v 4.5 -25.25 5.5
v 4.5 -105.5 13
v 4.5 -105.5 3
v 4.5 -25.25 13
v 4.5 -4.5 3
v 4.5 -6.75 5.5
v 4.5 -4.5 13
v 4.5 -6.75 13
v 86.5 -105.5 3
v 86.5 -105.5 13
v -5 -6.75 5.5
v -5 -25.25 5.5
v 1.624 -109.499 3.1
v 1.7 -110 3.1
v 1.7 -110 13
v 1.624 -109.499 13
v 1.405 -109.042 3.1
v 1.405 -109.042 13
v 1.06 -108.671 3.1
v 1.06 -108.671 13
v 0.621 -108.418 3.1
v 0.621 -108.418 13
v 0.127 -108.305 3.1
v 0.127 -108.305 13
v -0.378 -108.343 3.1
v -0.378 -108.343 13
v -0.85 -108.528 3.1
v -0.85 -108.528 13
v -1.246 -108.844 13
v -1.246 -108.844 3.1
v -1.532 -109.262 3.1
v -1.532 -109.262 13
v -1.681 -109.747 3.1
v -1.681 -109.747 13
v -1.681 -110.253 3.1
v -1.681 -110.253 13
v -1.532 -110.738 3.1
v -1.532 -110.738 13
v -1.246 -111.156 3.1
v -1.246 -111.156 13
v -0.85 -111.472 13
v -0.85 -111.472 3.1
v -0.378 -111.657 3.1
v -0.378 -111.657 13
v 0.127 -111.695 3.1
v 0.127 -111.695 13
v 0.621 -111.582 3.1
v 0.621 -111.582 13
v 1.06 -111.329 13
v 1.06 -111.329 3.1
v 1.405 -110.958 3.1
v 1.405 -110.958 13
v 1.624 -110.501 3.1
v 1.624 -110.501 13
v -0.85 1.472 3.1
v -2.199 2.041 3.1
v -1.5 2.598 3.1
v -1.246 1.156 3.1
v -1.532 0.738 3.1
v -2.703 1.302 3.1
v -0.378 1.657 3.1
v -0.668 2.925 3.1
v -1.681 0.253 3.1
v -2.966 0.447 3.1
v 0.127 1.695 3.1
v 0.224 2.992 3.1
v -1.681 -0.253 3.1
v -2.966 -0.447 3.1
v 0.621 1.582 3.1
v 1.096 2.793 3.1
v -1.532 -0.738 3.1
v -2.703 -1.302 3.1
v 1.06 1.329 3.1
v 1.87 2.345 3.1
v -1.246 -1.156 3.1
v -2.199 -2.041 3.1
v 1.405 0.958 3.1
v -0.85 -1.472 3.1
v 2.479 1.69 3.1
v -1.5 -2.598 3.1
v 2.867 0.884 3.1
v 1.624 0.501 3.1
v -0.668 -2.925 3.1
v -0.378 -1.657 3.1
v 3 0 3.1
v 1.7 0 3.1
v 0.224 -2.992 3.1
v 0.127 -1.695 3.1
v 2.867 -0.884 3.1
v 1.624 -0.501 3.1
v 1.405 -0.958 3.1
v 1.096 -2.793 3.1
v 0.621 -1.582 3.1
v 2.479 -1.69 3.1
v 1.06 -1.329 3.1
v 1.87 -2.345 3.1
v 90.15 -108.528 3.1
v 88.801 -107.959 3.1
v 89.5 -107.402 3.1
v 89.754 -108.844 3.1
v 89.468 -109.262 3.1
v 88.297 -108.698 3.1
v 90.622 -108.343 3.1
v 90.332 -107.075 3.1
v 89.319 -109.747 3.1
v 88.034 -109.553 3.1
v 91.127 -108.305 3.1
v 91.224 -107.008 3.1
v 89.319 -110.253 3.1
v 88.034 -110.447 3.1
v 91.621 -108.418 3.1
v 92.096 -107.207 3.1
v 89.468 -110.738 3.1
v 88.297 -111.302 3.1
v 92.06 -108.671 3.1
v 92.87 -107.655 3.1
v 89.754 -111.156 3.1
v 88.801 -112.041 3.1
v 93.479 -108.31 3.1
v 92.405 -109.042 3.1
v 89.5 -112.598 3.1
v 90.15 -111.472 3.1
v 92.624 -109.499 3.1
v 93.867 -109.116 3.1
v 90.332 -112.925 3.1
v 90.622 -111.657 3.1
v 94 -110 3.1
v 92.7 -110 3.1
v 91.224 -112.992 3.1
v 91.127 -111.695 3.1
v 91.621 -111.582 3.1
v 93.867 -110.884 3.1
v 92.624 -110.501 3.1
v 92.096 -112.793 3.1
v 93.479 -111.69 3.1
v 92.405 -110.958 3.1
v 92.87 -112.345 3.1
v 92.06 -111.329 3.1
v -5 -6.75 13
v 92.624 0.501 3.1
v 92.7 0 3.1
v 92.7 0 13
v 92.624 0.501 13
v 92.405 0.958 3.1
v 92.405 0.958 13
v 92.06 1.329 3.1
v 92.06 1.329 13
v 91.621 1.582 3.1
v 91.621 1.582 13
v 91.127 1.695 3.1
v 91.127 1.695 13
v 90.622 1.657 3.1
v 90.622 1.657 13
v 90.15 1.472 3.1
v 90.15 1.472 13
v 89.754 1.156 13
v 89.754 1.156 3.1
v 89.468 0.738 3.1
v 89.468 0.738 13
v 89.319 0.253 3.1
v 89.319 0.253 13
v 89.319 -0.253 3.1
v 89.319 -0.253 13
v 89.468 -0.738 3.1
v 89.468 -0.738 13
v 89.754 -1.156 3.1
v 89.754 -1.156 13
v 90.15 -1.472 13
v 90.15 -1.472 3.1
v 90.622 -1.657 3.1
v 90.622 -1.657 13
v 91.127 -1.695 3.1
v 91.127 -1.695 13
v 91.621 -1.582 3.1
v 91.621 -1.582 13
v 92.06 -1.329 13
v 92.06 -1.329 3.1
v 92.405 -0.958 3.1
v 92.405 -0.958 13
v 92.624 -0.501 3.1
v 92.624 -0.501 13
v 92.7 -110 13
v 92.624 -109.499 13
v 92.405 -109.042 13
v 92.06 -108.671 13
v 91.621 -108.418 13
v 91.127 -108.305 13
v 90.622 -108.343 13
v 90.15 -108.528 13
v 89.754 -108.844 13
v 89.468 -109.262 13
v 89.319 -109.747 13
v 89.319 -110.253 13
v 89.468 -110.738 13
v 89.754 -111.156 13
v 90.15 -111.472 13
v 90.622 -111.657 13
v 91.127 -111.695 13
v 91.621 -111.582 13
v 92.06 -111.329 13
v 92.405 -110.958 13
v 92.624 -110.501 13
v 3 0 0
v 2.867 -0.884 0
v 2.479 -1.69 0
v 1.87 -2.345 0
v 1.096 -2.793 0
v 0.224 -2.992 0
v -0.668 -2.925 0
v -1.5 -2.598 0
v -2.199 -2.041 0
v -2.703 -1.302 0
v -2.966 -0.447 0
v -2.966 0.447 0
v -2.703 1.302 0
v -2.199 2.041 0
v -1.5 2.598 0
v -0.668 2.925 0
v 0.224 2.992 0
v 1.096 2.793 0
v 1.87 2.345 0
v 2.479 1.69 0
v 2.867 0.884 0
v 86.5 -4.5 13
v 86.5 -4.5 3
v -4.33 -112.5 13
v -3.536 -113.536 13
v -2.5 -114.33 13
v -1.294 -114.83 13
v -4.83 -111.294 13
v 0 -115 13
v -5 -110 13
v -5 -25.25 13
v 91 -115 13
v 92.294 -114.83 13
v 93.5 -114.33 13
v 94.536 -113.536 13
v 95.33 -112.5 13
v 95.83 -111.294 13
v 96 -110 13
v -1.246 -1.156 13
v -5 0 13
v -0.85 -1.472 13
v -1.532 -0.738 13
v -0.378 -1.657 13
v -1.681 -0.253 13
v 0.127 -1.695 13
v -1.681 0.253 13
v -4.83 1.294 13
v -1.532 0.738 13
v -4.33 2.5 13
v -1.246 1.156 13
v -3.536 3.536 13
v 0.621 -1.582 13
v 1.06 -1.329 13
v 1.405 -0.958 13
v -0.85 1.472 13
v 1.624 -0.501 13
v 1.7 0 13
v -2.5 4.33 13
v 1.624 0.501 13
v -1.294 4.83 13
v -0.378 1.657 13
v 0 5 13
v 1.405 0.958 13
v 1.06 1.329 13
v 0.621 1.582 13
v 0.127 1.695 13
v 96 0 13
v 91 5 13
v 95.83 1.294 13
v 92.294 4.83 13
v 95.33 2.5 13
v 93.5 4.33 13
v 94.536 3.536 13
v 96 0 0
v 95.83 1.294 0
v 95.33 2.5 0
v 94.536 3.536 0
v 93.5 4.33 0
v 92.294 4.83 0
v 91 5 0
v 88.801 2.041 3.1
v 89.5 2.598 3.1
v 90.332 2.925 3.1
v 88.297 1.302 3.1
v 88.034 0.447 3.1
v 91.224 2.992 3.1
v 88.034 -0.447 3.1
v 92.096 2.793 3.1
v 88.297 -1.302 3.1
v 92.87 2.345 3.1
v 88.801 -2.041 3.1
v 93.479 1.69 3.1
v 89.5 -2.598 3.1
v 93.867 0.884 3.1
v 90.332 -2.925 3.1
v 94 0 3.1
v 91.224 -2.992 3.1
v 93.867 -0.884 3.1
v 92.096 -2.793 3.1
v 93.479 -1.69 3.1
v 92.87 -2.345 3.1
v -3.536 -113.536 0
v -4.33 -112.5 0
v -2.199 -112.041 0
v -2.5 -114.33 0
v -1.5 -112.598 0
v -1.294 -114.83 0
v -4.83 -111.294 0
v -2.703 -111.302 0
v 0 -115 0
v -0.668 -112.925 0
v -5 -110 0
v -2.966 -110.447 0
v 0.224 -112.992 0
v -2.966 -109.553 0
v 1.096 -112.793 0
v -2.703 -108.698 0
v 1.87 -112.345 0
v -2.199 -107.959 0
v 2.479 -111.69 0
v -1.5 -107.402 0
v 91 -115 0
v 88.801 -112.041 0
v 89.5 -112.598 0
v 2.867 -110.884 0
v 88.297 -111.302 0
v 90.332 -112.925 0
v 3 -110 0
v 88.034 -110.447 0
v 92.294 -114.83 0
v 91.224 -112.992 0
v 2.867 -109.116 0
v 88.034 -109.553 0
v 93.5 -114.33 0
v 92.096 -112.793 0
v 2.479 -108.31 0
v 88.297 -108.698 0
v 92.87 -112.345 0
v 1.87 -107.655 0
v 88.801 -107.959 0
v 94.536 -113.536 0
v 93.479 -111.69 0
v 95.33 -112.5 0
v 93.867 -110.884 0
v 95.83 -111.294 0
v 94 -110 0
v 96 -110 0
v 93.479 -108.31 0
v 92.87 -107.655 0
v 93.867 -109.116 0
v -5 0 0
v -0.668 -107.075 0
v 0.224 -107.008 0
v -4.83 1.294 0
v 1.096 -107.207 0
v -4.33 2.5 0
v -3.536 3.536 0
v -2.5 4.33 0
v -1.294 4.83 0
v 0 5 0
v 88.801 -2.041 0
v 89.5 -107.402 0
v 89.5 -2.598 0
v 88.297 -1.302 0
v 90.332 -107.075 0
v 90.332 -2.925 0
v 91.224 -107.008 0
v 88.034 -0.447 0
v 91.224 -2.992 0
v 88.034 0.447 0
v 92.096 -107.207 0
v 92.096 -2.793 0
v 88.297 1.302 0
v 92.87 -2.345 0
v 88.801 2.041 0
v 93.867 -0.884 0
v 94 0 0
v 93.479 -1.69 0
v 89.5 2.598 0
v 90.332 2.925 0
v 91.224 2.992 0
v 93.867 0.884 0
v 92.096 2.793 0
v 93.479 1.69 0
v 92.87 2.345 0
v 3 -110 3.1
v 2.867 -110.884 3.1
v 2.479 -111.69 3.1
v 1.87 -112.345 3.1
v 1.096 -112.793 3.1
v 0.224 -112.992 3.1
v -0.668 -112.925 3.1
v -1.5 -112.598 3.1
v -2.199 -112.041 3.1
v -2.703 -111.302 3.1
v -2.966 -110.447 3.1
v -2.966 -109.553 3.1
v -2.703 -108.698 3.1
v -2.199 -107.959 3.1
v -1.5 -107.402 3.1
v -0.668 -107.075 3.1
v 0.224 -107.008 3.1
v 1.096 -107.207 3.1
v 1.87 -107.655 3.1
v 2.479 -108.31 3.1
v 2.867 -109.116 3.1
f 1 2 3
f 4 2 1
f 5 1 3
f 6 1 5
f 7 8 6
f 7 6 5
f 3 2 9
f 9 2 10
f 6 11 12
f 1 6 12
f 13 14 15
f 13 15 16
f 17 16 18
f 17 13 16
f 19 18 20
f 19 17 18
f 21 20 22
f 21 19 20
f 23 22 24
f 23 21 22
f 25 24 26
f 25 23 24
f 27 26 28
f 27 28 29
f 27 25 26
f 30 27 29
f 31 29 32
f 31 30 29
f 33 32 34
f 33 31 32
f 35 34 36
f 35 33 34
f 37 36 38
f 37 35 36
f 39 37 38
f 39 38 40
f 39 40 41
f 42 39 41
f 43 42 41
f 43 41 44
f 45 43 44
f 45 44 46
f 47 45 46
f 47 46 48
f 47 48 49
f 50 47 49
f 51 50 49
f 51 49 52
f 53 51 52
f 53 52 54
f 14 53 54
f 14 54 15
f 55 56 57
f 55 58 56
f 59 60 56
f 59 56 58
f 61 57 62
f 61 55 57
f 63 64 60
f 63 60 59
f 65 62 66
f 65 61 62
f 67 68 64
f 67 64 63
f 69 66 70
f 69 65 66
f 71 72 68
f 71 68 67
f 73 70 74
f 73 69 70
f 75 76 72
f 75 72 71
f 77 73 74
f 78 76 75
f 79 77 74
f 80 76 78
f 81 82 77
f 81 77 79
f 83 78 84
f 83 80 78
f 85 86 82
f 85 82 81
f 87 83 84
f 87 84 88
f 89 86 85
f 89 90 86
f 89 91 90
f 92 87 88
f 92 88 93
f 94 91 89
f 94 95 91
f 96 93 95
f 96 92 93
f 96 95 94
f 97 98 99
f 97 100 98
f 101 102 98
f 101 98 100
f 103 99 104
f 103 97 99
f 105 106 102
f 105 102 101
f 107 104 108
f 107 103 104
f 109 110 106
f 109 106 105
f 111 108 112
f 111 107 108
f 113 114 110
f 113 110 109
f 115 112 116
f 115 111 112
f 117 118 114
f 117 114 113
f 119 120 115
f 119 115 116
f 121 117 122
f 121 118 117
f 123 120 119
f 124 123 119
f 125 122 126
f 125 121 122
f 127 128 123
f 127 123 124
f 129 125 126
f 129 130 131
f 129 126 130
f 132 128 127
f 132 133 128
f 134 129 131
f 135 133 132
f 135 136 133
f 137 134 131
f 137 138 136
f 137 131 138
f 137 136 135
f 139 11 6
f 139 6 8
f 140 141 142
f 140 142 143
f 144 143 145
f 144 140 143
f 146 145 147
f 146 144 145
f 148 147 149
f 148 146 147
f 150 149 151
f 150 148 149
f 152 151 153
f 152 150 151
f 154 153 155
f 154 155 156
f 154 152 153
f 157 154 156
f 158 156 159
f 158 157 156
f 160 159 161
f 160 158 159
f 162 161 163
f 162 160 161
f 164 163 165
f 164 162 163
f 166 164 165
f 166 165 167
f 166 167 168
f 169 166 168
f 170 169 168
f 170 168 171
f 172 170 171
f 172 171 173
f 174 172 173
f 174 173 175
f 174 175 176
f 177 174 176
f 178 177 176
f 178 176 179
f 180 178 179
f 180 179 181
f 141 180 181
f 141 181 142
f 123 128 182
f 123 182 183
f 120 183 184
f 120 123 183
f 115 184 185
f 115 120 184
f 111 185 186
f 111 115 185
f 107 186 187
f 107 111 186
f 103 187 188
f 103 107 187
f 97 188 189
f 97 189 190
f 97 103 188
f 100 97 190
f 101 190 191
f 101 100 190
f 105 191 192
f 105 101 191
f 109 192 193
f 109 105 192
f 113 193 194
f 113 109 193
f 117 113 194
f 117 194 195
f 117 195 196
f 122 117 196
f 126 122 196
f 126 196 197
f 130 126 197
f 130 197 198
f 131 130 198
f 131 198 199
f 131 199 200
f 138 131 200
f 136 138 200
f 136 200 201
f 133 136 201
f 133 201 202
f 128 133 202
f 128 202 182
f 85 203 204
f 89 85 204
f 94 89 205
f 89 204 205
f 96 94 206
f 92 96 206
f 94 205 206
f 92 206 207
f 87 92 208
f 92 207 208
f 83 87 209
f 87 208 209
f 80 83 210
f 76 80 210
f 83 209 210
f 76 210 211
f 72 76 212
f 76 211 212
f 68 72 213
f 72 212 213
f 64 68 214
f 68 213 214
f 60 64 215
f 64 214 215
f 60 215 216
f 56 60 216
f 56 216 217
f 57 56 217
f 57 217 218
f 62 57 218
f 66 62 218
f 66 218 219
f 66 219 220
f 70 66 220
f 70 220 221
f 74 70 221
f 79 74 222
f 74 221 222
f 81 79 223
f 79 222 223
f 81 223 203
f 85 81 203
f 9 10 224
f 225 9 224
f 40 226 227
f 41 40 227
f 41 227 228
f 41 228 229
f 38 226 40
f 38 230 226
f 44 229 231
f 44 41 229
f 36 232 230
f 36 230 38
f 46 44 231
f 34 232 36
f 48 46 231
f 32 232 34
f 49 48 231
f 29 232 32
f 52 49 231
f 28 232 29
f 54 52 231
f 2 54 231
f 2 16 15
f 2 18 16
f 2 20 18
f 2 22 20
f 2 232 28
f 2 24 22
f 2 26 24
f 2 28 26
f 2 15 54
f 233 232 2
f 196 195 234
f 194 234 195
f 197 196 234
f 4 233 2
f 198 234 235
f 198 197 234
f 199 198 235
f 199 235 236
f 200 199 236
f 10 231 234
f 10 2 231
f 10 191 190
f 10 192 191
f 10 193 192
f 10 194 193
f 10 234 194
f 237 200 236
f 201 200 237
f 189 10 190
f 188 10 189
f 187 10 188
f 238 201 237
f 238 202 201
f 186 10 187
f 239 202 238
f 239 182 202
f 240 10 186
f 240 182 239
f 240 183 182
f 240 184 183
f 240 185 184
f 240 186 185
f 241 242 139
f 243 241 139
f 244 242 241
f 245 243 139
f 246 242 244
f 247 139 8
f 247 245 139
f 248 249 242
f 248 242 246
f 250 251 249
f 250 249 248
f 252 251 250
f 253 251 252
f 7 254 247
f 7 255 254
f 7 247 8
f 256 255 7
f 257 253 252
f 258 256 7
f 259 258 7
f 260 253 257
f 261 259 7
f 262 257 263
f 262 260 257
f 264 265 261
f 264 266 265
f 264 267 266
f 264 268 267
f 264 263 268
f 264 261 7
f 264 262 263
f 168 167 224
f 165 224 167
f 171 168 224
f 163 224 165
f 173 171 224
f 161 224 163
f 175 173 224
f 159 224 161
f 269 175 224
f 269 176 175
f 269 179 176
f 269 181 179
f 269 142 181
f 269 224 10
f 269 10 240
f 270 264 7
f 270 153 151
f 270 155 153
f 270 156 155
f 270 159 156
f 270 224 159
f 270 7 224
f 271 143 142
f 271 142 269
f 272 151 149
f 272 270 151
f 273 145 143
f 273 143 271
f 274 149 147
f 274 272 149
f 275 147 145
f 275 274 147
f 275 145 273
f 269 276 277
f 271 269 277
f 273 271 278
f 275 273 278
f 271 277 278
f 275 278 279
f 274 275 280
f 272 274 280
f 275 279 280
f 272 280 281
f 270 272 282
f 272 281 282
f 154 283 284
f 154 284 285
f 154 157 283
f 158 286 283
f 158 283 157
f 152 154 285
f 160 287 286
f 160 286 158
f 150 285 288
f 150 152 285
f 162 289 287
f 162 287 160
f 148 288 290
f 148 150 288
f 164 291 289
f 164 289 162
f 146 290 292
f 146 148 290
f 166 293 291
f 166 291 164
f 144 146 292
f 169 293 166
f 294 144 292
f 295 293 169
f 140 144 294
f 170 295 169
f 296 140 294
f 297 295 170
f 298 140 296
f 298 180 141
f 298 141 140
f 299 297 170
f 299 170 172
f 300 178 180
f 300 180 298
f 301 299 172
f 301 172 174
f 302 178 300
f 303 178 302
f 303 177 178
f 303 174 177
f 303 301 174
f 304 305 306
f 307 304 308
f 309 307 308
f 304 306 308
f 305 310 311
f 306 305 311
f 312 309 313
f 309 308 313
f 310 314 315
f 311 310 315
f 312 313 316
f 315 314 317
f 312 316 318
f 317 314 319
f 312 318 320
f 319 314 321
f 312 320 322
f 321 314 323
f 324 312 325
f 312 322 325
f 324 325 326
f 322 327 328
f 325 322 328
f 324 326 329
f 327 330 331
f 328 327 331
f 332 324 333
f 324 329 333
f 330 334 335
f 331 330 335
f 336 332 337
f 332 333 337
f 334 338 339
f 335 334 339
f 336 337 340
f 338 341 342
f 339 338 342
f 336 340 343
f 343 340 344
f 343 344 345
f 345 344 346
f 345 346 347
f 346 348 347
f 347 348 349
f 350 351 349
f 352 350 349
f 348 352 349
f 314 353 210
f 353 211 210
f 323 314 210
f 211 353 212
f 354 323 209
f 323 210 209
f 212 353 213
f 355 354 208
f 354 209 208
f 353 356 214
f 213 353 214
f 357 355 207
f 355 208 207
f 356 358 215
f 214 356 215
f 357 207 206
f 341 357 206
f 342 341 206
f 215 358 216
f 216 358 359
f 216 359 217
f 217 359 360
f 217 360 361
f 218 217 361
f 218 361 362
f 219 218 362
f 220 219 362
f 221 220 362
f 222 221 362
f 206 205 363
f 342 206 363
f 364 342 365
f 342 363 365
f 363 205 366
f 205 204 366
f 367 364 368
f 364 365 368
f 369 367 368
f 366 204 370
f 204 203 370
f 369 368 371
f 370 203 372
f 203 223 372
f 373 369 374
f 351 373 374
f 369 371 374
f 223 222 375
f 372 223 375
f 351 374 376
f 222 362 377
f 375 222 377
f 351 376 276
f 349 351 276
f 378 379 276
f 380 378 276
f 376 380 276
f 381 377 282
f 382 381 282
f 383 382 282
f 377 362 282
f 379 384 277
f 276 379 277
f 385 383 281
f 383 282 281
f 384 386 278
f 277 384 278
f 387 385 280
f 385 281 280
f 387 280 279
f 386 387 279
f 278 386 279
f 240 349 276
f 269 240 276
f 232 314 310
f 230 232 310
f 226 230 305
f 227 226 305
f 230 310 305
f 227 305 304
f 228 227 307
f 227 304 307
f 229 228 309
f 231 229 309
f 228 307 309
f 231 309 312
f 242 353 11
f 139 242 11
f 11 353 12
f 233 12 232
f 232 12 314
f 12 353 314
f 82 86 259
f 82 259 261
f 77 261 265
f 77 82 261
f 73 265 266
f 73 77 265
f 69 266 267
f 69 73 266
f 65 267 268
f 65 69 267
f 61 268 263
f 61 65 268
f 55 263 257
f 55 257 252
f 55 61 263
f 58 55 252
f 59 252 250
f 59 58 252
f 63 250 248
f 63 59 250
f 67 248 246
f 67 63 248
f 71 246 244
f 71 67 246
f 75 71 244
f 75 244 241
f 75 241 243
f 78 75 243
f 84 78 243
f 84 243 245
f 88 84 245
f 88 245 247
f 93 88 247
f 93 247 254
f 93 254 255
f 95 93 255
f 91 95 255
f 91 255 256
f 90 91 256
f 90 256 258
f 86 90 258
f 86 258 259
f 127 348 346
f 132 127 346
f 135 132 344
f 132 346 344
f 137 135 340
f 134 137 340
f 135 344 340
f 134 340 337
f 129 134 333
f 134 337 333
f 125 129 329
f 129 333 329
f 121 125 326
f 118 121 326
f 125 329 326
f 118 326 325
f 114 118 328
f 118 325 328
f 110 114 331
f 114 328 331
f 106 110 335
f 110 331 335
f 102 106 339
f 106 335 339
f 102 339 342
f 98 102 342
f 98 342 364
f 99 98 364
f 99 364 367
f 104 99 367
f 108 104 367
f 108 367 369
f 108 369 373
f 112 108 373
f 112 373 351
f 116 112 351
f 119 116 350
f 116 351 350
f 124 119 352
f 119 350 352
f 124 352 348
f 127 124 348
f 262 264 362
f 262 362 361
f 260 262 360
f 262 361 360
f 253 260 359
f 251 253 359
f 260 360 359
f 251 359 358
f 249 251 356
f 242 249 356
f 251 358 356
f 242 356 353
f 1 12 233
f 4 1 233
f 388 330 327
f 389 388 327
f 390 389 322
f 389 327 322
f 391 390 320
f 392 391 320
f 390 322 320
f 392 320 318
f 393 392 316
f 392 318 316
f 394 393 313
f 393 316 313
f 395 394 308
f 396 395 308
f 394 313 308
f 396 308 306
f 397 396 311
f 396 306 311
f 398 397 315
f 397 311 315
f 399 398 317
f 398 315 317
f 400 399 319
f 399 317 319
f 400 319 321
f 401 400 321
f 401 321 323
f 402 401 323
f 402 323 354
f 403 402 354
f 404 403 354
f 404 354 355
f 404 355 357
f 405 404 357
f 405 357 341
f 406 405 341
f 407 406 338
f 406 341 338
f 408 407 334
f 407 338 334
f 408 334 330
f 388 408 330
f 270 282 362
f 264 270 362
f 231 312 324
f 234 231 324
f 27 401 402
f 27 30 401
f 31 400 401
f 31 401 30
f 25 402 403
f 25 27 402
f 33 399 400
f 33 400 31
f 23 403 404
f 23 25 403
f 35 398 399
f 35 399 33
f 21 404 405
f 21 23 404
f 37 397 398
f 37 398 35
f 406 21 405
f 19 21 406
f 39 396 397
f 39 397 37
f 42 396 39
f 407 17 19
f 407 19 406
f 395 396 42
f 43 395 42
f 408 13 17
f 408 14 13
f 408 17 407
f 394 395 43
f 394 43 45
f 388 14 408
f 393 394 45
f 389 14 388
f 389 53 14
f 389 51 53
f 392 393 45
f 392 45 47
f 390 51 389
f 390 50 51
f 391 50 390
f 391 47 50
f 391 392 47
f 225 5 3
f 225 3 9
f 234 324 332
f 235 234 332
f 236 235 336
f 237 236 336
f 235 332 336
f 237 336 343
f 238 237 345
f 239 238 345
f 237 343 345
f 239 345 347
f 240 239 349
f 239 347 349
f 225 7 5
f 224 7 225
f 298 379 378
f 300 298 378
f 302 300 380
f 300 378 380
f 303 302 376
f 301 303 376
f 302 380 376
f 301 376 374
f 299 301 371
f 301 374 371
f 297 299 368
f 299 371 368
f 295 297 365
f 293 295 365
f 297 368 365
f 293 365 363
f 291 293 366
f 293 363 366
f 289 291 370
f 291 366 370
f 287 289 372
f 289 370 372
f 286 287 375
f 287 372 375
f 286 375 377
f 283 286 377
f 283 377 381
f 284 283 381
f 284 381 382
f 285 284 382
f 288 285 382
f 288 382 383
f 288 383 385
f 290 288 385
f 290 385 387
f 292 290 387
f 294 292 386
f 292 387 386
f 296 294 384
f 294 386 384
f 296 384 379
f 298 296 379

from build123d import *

# Parameters (mm, degrees)
SKETCH_R        = 1.7
PAD_DEPTH       = 13
SKETCH001_W     = 82
SKETCH001_H     = 101
POCKET_DEPTH    = 10
SKETCH002_W     = 18.5
SKETCH002_H     = 7.5
POCKET001_DEPTH = 11
SKETCH003_R     = 3
POCKET002_DEPTH = 3.1


with BuildPart() as part:
    # Sketch → Pad (new body)
    with BuildSketch(Plane.XY):
        with BuildLine():
            Line((-5, 0), (-5, -110))
            ThreePointArc((-5, -110), (-3.535534, -113.535534), (0, -115))
            Line((0, -115), (91, -115))
            ThreePointArc((91, -115), (94.535534, -113.535534), (96, -110))
            Line((96, -110), (96, 0))
            ThreePointArc((96, 0), (94.535534, 3.535534), (91, 5))
            Line((91, 5), (0, 5))
            ThreePointArc((0, 5), (-3.535534, 3.535534), (-5, 0))
        make_face()
        Circle(SKETCH_R, mode=Mode.SUBTRACT)
        with Locations((91, 0)):
            Circle(SKETCH_R, mode=Mode.SUBTRACT)
        with Locations((91, -110)):
            Circle(SKETCH_R, mode=Mode.SUBTRACT)
        with Locations((0, -110)):
            Circle(SKETCH_R, mode=Mode.SUBTRACT)
    extrude(amount=PAD_DEPTH)

    # Sketch001 (on Face14 of Pad) → Pocket (cut)
    with BuildSketch(Plane.XY.offset(13)):
        with Locations((45.5, -55)):
            Rectangle(SKETCH001_W, SKETCH001_H)
    extrude(amount=-POCKET_DEPTH, mode=Mode.SUBTRACT)

    # Sketch002 (on Face1 of Pocket) → Pocket001 (cut)
    with BuildSketch(Plane(origin=(-5, 0, 0), x_dir=(0, -1, 0), z_dir=(-1, 0, 0))):
        with Locations((16, 9.25)):
            Rectangle(SKETCH002_W, SKETCH002_H)
    extrude(amount=-POCKET001_DEPTH, mode=Mode.SUBTRACT)

    # Sketch003 (on Face2 of Pocket001) → Pocket002 (cut)
    with BuildSketch(Plane(origin=(0, 0, 0), x_dir=(1, 0, 0), z_dir=(0, 0, -1))):
        with Locations((0, 110)):
            Circle(SKETCH003_R)
        with Locations((91, 110)):
            Circle(SKETCH003_R)
        with Locations((91, 0)):
            Circle(SKETCH003_R)
        Circle(SKETCH003_R)
    extrude(amount=-POCKET002_DEPTH, mode=Mode.SUBTRACT)


solid = part.part
